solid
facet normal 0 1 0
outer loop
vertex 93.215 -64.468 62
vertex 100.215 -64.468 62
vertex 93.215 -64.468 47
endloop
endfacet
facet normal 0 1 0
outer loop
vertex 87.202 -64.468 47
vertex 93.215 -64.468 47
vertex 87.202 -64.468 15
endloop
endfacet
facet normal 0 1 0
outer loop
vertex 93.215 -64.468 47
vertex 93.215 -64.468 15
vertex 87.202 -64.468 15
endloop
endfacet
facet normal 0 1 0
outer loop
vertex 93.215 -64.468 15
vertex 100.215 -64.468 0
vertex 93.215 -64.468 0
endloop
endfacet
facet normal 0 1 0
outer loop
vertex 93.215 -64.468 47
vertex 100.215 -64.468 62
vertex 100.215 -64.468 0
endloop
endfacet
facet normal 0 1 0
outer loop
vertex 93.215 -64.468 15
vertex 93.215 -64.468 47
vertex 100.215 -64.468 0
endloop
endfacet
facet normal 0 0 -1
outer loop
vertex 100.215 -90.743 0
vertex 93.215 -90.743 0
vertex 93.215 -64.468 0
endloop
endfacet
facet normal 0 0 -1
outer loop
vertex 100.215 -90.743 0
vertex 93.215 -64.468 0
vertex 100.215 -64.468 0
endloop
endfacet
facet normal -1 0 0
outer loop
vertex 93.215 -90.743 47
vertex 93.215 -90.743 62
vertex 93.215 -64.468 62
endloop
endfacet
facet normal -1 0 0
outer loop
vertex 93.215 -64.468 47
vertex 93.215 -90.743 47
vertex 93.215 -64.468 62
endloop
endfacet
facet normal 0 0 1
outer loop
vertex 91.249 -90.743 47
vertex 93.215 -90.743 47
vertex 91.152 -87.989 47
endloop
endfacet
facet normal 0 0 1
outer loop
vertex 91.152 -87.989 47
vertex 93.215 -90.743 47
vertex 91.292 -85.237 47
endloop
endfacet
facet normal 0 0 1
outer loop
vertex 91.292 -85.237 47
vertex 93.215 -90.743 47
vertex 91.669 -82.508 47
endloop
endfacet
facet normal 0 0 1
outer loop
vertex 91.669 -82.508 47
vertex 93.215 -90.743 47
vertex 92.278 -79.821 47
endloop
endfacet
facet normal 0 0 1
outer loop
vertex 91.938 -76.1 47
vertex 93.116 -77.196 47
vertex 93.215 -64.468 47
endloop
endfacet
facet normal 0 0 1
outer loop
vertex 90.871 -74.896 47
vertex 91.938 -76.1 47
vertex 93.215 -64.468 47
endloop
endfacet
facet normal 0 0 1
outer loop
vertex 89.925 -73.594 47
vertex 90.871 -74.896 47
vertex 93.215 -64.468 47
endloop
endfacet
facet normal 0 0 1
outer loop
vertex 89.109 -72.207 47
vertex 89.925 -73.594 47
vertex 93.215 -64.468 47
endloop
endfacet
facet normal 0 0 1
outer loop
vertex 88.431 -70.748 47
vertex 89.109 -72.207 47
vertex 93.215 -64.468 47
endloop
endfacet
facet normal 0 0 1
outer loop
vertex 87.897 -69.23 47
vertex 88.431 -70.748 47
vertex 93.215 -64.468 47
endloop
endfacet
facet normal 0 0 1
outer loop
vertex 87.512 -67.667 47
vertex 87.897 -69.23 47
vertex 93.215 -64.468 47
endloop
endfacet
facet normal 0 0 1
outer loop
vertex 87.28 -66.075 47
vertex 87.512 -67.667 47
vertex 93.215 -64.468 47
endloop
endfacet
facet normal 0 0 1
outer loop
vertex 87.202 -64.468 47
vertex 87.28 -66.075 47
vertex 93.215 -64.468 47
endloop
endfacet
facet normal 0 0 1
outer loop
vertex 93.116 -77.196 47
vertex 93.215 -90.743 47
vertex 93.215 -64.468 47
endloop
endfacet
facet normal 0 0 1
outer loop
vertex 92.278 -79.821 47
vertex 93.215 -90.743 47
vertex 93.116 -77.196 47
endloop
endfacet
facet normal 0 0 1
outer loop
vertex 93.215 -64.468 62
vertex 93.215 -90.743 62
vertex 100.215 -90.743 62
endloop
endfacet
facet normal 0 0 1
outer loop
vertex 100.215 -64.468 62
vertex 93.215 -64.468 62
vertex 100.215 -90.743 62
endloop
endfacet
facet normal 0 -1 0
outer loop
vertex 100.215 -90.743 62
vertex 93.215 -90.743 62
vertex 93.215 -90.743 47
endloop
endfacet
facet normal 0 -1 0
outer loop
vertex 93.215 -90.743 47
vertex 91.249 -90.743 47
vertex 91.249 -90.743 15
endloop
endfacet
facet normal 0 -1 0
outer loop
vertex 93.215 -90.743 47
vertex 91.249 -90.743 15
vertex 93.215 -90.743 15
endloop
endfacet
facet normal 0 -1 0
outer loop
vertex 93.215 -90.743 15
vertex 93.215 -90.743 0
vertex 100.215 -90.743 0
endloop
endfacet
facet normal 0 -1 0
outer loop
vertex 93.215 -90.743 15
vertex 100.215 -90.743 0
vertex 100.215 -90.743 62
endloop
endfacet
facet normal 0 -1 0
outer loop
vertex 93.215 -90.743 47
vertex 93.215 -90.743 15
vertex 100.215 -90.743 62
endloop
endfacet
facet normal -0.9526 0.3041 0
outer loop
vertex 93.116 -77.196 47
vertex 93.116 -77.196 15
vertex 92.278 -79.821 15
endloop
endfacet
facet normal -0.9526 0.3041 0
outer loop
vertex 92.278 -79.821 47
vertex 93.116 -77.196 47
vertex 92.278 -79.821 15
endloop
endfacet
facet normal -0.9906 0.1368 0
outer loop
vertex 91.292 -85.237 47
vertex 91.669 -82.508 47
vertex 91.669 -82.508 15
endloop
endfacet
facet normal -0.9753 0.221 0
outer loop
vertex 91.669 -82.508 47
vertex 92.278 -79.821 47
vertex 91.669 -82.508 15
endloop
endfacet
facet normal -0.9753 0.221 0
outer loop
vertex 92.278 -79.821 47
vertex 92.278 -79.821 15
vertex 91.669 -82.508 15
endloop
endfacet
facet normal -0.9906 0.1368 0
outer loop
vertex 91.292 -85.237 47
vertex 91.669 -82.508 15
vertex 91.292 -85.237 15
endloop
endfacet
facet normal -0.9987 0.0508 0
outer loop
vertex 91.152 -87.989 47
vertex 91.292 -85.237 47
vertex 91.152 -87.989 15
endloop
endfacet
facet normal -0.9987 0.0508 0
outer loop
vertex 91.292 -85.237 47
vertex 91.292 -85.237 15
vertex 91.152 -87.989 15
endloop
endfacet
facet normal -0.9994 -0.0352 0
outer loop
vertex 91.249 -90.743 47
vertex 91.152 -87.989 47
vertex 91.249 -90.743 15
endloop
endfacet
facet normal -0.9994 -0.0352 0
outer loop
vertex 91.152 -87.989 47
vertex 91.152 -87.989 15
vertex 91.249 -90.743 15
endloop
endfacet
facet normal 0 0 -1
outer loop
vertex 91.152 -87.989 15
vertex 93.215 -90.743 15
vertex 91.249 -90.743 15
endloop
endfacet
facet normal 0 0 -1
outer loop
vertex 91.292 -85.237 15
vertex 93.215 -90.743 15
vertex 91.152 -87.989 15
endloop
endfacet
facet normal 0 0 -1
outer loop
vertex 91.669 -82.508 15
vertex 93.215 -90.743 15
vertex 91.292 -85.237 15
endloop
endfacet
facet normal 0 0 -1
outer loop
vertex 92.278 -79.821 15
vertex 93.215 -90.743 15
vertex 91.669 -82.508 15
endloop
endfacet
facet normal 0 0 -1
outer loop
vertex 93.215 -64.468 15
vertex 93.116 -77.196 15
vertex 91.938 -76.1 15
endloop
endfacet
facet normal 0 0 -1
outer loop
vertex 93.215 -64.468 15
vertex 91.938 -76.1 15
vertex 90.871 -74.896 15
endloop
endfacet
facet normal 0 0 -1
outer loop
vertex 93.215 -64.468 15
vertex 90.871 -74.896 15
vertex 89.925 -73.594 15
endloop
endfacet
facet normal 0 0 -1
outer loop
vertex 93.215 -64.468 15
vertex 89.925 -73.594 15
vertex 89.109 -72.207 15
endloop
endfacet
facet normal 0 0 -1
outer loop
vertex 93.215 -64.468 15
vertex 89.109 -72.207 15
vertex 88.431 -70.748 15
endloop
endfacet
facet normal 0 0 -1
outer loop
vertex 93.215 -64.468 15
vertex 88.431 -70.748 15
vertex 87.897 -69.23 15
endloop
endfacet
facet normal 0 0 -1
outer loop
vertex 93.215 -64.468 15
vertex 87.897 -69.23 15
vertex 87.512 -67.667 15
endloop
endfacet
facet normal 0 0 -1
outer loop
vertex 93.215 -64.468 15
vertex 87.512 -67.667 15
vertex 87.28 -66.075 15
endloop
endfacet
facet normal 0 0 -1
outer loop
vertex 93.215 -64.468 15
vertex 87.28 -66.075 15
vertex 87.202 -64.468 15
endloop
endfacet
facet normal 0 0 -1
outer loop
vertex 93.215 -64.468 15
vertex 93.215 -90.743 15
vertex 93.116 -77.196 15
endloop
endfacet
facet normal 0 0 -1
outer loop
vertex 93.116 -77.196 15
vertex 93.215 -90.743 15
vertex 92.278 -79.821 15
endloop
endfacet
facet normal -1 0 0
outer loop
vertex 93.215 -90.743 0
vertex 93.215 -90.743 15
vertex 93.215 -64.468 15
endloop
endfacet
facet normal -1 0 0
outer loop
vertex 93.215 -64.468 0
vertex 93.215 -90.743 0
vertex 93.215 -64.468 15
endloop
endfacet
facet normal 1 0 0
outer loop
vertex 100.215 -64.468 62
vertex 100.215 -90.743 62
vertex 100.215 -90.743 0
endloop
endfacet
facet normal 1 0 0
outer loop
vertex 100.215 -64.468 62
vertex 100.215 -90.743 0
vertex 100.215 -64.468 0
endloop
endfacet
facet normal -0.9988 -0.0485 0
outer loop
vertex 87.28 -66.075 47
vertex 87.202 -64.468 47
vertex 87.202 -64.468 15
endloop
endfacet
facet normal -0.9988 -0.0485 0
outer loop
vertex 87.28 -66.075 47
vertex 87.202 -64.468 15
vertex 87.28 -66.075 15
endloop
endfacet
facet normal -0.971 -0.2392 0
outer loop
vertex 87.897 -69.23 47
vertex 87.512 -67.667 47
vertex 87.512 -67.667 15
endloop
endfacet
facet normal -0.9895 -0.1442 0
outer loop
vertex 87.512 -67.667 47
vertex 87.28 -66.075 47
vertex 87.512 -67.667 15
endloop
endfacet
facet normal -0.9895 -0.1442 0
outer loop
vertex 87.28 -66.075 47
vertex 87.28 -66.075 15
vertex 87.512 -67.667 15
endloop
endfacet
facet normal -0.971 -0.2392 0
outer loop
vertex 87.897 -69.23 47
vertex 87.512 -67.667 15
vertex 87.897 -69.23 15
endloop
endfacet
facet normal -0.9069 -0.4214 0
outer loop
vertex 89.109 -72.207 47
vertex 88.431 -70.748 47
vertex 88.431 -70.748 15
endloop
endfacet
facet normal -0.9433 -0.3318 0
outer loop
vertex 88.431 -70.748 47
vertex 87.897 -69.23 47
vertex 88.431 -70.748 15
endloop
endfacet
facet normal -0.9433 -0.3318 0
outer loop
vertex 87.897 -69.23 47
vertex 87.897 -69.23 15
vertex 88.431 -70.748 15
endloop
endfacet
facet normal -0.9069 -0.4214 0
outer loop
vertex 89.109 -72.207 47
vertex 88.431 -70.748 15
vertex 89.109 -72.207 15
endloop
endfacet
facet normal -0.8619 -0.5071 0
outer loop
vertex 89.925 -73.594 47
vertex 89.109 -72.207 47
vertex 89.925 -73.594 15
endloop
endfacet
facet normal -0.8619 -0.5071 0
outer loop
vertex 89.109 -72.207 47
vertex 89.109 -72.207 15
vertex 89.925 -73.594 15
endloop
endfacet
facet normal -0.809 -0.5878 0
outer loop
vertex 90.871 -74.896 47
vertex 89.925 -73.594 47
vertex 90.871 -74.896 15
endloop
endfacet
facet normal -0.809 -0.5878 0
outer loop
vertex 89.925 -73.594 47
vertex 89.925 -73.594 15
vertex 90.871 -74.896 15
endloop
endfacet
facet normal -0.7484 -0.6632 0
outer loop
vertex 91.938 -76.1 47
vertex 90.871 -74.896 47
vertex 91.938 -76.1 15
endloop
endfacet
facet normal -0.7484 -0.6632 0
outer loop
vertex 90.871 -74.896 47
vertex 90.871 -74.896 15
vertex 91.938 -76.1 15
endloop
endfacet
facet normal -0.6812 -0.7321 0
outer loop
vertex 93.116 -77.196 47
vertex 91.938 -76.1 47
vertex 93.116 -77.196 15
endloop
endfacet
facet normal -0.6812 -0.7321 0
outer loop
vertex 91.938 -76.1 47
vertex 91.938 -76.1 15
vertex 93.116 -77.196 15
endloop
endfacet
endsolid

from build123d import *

# Parameters (mm, degrees)
F1_DEPTH = 62
F3_W     = 26.2750325567
F3_H     = 15
F4_DEPTH = 25


with BuildPart() as f1:
    # F0 (on Top) → F1 (new body)
    with BuildSketch(Plane.XY):
        with BuildLine():
            Line((100.2154187574, -64.4678249955), (87.201975286, -64.4678249955))
            ThreePointArc((87.201975286, -64.4678249955), (88.7526881566, -71.4854053398), (93.1160420433, -77.1961222085))
            ThreePointArc((93.1160420433, -77.1961222085), (91.4511190136, -83.8686795317), (91.2494597241, -90.7428575522))
            Line((91.2494597241, -90.7428575522), (100.2154187574, -90.7428575522))
            Line((100.2154187574, -90.7428575522), (100.2154187574, -64.4678249955))
        make_face()
    extrude(amount=F1_DEPTH)

    # F3 (on offset) → F4 (cut)
    with BuildSketch(Plane.YZ.offset(93.2154187574)):
        with Locations((-77.6053412739, 54.5)):
            Rectangle(F3_W, F3_H)
        with Locations((-77.6053412739, 7.5)):
            Rectangle(F3_W, F3_H)
    extrude(amount=-F4_DEPTH, mode=Mode.SUBTRACT)


solid = f1.part
